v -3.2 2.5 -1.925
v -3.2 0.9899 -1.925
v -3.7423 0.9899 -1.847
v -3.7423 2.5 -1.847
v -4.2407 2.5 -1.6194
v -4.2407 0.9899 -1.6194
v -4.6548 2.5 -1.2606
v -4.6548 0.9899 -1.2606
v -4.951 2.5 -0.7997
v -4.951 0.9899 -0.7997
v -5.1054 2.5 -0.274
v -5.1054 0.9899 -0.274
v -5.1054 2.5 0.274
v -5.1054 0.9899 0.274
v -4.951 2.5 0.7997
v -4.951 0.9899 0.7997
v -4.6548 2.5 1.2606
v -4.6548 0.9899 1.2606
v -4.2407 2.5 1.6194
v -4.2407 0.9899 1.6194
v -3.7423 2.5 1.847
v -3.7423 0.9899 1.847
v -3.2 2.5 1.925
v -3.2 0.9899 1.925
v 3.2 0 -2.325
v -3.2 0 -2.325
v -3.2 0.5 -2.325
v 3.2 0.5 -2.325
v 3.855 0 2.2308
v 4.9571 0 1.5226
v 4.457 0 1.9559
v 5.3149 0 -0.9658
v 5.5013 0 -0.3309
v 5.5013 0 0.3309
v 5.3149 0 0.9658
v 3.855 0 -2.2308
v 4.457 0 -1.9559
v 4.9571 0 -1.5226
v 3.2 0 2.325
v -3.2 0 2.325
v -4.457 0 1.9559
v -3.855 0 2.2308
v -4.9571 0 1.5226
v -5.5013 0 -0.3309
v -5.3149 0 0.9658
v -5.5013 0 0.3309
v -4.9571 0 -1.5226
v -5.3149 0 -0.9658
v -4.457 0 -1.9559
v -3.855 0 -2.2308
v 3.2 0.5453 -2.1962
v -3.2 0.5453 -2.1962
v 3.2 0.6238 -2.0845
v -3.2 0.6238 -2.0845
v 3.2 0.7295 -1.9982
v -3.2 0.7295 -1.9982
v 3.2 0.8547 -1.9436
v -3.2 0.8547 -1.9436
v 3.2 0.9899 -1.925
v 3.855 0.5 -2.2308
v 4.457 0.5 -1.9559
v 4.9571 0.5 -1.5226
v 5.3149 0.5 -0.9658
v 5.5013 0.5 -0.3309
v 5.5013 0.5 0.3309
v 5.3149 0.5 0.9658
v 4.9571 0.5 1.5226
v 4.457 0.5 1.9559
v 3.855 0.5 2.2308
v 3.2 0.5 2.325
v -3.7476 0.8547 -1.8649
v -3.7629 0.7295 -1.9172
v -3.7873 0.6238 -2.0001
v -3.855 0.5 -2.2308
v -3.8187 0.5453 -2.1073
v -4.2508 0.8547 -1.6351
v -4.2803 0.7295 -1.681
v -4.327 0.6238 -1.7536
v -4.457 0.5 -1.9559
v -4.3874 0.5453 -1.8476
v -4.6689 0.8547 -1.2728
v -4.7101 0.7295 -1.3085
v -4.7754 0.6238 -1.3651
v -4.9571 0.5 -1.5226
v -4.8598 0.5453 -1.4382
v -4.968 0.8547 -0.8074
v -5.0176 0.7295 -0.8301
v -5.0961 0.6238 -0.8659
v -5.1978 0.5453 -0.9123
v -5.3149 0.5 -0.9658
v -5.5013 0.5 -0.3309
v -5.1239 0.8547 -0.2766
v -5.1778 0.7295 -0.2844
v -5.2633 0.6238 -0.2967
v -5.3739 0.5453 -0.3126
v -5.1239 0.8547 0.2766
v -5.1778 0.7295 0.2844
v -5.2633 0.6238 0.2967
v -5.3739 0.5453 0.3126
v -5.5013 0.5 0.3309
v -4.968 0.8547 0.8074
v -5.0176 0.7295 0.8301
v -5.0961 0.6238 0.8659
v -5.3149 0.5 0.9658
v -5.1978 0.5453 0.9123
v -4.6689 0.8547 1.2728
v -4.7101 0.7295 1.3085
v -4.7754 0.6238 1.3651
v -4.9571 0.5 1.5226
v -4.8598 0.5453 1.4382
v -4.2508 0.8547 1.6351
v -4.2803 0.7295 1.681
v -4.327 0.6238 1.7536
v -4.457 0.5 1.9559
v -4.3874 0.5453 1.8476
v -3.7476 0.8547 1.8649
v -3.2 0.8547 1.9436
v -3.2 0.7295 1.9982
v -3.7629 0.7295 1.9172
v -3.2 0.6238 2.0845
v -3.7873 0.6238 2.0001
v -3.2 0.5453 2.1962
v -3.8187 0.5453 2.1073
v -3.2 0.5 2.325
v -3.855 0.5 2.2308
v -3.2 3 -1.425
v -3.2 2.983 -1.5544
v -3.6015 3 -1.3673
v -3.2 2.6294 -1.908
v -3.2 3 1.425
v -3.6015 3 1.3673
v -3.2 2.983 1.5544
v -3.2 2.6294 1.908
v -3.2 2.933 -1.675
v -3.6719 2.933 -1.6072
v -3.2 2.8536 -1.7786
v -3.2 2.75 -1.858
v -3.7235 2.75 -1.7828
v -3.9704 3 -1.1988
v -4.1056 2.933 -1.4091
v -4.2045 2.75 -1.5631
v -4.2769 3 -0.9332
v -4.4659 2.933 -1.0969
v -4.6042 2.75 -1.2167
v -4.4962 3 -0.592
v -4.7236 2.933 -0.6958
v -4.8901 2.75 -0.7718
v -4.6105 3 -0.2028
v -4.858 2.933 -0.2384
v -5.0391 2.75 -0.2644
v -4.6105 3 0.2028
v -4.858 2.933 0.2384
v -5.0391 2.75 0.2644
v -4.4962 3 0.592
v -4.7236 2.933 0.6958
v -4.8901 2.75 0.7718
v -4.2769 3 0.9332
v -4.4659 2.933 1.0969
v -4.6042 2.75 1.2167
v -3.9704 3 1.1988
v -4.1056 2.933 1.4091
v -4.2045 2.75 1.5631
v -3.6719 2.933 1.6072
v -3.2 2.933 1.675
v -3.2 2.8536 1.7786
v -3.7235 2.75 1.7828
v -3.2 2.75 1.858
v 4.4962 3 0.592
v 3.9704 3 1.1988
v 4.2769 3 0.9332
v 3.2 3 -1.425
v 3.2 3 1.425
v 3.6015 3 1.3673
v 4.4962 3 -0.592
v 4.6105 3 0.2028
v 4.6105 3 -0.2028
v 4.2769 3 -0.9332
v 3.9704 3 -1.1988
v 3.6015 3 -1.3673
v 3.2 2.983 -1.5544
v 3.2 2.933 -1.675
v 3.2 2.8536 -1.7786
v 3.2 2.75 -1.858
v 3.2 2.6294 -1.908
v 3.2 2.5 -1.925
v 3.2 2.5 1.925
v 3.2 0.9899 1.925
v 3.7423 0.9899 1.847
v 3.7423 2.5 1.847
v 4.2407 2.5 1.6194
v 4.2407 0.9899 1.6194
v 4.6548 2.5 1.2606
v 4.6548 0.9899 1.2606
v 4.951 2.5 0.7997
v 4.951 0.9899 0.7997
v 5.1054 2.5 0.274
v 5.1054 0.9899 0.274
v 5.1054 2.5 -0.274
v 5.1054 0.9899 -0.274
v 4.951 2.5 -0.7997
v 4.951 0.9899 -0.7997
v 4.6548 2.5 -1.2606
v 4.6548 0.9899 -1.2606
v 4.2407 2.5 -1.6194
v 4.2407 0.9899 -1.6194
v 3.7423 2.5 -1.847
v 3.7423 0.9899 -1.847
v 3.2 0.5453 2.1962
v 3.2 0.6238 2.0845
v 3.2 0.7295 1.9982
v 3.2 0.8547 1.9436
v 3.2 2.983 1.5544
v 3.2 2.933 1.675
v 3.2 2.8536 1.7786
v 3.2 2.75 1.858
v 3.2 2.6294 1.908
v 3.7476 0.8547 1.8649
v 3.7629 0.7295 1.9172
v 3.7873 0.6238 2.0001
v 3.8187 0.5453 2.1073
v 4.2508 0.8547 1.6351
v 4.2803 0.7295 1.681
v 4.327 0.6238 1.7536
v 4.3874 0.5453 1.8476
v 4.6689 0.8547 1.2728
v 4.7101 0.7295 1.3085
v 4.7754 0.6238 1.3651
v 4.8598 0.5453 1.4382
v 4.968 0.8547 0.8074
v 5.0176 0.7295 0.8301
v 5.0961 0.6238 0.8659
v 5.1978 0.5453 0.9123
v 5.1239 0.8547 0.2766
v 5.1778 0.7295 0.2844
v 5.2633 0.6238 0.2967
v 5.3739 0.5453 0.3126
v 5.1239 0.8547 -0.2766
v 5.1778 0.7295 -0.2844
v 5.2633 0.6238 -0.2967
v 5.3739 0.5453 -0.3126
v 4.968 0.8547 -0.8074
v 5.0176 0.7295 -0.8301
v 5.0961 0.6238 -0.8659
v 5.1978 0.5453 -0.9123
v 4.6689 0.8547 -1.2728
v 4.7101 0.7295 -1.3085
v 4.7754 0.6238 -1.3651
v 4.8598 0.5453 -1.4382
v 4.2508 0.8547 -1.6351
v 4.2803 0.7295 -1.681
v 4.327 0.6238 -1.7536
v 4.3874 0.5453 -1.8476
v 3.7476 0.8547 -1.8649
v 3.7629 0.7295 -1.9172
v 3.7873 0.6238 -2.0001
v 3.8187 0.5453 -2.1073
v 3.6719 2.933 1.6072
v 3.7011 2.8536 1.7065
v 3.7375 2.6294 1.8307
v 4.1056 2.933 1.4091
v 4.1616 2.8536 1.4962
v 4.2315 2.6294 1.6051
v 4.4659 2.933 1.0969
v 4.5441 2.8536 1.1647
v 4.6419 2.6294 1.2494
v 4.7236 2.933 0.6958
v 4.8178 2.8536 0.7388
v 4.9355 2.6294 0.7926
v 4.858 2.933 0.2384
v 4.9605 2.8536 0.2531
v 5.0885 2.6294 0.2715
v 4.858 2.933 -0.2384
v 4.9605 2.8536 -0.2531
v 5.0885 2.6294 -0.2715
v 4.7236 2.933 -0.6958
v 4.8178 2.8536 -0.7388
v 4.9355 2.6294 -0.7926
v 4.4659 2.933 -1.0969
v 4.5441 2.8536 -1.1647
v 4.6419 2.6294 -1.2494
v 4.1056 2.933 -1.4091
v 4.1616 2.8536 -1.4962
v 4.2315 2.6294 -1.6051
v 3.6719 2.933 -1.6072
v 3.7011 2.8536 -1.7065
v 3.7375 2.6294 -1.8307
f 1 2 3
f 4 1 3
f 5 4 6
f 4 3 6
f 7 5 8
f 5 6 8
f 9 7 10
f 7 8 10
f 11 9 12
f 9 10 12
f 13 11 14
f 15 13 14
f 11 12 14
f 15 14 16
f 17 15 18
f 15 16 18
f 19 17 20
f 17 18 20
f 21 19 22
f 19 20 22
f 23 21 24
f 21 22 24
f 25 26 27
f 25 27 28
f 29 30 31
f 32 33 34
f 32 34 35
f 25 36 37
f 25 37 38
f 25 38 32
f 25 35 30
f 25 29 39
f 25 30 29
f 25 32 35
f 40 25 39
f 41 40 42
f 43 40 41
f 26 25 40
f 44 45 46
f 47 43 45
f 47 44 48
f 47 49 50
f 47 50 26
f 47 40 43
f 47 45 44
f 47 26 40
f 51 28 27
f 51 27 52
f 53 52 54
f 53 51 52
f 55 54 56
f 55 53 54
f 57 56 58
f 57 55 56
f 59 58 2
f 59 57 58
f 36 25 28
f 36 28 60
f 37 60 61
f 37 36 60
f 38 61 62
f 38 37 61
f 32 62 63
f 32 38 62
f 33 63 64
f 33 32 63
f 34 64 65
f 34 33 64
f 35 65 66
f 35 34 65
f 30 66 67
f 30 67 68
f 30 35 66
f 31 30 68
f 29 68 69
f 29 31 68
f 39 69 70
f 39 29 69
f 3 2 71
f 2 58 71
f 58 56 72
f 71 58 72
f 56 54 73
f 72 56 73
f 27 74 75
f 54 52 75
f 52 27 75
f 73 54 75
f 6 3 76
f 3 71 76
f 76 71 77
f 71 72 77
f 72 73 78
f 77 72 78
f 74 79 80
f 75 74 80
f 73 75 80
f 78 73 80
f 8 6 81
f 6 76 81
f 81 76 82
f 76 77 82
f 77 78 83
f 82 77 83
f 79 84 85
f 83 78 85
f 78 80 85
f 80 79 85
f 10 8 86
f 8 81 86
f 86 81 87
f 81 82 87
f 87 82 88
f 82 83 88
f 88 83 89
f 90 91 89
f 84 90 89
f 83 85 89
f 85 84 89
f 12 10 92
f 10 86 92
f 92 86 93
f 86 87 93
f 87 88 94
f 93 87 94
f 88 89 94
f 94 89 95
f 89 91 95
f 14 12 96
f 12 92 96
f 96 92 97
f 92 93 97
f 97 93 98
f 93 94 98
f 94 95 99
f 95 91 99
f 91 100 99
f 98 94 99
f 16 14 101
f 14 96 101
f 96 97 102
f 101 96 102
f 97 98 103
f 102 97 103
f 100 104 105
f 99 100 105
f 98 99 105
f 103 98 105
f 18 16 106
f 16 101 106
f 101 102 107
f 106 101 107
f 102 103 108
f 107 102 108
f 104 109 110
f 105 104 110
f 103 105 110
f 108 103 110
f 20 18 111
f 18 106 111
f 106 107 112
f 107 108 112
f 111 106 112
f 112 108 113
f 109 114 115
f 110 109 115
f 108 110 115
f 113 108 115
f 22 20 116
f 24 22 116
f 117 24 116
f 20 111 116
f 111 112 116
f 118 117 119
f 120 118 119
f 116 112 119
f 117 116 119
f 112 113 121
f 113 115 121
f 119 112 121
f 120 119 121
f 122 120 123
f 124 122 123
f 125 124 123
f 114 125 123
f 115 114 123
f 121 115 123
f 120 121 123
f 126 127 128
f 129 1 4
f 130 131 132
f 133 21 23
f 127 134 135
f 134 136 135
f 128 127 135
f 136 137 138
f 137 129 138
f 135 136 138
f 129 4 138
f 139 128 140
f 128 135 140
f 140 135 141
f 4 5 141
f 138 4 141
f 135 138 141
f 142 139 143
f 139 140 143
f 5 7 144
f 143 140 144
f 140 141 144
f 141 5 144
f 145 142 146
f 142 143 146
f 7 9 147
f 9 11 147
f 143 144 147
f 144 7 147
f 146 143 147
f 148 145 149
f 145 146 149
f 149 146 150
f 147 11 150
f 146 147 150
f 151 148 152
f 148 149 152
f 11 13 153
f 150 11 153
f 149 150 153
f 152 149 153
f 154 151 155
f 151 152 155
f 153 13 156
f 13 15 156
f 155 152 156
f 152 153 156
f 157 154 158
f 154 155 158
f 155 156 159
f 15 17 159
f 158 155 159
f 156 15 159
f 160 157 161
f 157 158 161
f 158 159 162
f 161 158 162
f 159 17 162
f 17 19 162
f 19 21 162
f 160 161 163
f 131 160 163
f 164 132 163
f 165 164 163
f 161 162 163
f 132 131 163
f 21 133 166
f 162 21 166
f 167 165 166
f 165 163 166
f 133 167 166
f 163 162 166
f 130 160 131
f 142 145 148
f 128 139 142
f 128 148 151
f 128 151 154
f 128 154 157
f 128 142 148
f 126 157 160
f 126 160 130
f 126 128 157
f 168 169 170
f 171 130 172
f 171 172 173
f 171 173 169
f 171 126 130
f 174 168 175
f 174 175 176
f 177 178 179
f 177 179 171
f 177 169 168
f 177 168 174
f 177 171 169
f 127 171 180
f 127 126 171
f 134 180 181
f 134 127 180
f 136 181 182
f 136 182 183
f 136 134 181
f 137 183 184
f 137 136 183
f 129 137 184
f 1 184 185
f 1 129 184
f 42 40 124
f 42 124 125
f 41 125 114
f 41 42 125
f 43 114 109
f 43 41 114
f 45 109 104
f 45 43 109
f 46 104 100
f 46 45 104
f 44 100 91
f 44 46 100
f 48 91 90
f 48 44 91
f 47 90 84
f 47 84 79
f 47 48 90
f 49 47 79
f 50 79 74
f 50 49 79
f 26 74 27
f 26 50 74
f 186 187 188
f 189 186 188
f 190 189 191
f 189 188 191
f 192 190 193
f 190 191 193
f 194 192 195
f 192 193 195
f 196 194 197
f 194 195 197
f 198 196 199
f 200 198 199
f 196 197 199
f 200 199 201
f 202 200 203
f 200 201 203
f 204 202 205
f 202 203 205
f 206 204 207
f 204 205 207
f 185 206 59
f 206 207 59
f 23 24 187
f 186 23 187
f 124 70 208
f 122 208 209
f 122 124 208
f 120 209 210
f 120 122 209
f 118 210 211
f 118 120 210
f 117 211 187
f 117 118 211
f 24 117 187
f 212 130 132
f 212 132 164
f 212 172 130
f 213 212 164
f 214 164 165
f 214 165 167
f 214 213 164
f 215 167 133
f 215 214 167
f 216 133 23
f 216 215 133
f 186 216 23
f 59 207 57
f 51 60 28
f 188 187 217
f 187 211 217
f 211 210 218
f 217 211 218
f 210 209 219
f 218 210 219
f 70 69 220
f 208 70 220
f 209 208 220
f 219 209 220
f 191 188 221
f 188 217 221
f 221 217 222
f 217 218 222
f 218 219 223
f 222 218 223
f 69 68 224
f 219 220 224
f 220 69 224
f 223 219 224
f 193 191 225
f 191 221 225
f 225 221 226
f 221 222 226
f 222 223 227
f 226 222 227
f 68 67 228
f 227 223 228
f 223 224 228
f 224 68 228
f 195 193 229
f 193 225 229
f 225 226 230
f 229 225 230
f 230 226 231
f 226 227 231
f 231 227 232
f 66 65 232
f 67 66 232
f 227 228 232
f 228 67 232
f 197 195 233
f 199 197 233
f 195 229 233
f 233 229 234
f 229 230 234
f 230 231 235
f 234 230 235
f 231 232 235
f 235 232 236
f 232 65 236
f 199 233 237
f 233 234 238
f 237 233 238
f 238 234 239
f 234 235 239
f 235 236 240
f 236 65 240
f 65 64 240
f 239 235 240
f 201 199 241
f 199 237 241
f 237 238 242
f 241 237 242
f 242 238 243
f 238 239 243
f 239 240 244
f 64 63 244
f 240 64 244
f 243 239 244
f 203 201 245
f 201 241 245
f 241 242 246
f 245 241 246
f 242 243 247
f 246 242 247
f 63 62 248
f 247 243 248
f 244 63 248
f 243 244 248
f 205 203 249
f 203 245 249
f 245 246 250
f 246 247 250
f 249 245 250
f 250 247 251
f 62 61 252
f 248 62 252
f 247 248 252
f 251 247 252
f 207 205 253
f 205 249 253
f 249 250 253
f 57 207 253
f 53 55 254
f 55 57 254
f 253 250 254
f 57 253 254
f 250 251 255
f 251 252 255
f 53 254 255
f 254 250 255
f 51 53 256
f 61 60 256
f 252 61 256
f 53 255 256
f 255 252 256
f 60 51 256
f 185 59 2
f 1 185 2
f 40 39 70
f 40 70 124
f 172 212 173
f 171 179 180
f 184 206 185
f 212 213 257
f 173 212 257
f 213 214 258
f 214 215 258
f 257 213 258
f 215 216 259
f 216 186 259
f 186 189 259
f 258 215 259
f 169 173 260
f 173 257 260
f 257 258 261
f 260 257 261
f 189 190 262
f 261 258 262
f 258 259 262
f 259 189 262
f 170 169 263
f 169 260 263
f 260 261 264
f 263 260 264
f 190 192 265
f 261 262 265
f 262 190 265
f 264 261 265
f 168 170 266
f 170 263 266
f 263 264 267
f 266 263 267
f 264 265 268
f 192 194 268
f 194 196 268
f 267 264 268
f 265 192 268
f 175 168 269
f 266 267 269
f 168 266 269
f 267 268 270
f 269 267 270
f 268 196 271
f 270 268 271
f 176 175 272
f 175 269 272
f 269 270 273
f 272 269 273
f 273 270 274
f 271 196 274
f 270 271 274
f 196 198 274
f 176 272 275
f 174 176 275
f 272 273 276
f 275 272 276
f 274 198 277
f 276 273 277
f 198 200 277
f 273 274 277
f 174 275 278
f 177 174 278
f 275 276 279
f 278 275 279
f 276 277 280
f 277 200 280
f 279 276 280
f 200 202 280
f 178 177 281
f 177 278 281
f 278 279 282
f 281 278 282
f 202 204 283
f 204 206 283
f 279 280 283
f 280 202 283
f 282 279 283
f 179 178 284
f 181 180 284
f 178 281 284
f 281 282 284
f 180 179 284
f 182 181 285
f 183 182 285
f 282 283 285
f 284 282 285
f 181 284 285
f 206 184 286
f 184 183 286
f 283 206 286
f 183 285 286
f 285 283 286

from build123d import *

# Parameters (mm, degrees)
BOSS_EXTRUDE1_DEPTH = 0.5
BOSS_EXTRUDE2_DEPTH = 2.5
FILLET1_R           = 0.5
FILLET3_R           = 0.5


with BuildPart() as part:
    # Sketch1 → Boss-Extrude1 (new body)
    with BuildSketch(Plane(origin=(0, 0, 0), x_dir=(1, 0, 0), z_dir=(0, 1, 0))):
        with BuildLine():
            Line((-3.2, 2.325), (3.2, 2.325))
            ThreePointArc((3.2, 2.325), (5.525, 0), (3.2, -2.325))
            Line((3.2, -2.325), (-3.2, -2.325))
            ThreePointArc((-3.2, -2.325), (-5.525, 0), (-3.2, 2.325))
        make_face()
    extrude(amount=BOSS_EXTRUDE1_DEPTH)

    # Sketch2 → Boss-Extrude2 (add)
    with BuildSketch(Plane(origin=(0, 0.5, 0), x_dir=(1, 0, 0), z_dir=(0, 1, 0))):
        with BuildLine():
            Line((-3.2, -1.925), (3.2, -1.925))
            ThreePointArc((3.2, -1.925), (5.125, 0), (3.2, 1.925))
            Line((3.2, 1.925), (-3.2, 1.925))
            ThreePointArc((-3.2, 1.925), (-5.125, 0), (-3.2, -1.925))
        make_face()
    extrude(amount=BOSS_EXTRUDE2_DEPTH)

    # Fillet1
    # the kernel refuses this fillet: 0.5 mm, written as the material it adds along each edge
    with BuildSketch(Plane(origin=(-3.2, 0.5, 0), x_dir=(0, 0, -1), z_dir=(1, 0, 0))) as fillet1_piece_1:
        with BuildLine():
            CenterArc((2.425, 0.489897949), FILLET1_R, 180, 78.463040967)
            Line((1.925, 0.489897949), (1.915, 0.489897949))
            Line((1.915, 0.489897949), (1.915, 0))
            Line((1.915, 0), (1.925, -0.01))
            ThreePointArc((1.925, -0.01), (2.125, -0.01), (2.323, -0.009797959))
            Line((2.323, -0.009797959), (2.325, 0))
        make_face()
    revolve(axis=Axis((-3.2, 0.5, 0), (0, 1, 0)), revolution_arc=180)
    with BuildSketch(Plane(origin=(-3.2, 0.5, 1.925), x_dir=(0, 1.5665246877455952e-12, 1.0), z_dir=(1, 0, 0)), Plane(origin=(3.2, 0.5, -1.925), x_dir=(0, 1.5665246877455952e-12, -1.0), z_dir=(-1, 0, 0))) as fillet1_piece_2:
        with BuildLine():
            CenterArc((0.5, -0.489897949), FILLET1_R, 101.536959033, 78.463040967)
            Line((0, -0.489897949), (-0.01, -0.489897949))
            Line((-0.01, -0.489897949), (-0.01, 0))
            Line((-0.01, 0), (0, 0.01))
            ThreePointArc((0, 0.01), (0.2, 0.01), (0.398, 0.009797959))
            Line((0.398, 0.009797959), (0.4, 0))
        make_face()
    extrude(amount=6.4)
    with BuildSketch(Plane(origin=(3.2, 0.5, 0), x_dir=(0, 0, 1), z_dir=(-1, 0, 0))) as fillet1_piece_3:
        with BuildLine():
            CenterArc((2.425, 0.489897949), FILLET1_R, 180, 78.463040967)
            Line((1.925, 0.489897949), (1.915, 0.489897949))
            Line((1.915, 0.489897949), (1.915, 0))
            Line((1.915, 0), (1.925, -0.01))
            ThreePointArc((1.925, -0.01), (2.125, -0.01), (2.323, -0.009797959))
            Line((2.323, -0.009797959), (2.325, 0))
        make_face()
    revolve(axis=Axis((3.2, 0.5, 0), (0, 1, 0)), revolution_arc=180)

    # Fillet3
    fillet3_edges = [part.edges().sort_by_distance(p)[0] for p in [
        (-5.125, 3, 0),
        (0, 3, 1.925),
        (5.125, 3, 0),
        (0, 3, -1.925),
    ]]
    fillet(fillet3_edges, radius=FILLET3_R)


solid = part.part
